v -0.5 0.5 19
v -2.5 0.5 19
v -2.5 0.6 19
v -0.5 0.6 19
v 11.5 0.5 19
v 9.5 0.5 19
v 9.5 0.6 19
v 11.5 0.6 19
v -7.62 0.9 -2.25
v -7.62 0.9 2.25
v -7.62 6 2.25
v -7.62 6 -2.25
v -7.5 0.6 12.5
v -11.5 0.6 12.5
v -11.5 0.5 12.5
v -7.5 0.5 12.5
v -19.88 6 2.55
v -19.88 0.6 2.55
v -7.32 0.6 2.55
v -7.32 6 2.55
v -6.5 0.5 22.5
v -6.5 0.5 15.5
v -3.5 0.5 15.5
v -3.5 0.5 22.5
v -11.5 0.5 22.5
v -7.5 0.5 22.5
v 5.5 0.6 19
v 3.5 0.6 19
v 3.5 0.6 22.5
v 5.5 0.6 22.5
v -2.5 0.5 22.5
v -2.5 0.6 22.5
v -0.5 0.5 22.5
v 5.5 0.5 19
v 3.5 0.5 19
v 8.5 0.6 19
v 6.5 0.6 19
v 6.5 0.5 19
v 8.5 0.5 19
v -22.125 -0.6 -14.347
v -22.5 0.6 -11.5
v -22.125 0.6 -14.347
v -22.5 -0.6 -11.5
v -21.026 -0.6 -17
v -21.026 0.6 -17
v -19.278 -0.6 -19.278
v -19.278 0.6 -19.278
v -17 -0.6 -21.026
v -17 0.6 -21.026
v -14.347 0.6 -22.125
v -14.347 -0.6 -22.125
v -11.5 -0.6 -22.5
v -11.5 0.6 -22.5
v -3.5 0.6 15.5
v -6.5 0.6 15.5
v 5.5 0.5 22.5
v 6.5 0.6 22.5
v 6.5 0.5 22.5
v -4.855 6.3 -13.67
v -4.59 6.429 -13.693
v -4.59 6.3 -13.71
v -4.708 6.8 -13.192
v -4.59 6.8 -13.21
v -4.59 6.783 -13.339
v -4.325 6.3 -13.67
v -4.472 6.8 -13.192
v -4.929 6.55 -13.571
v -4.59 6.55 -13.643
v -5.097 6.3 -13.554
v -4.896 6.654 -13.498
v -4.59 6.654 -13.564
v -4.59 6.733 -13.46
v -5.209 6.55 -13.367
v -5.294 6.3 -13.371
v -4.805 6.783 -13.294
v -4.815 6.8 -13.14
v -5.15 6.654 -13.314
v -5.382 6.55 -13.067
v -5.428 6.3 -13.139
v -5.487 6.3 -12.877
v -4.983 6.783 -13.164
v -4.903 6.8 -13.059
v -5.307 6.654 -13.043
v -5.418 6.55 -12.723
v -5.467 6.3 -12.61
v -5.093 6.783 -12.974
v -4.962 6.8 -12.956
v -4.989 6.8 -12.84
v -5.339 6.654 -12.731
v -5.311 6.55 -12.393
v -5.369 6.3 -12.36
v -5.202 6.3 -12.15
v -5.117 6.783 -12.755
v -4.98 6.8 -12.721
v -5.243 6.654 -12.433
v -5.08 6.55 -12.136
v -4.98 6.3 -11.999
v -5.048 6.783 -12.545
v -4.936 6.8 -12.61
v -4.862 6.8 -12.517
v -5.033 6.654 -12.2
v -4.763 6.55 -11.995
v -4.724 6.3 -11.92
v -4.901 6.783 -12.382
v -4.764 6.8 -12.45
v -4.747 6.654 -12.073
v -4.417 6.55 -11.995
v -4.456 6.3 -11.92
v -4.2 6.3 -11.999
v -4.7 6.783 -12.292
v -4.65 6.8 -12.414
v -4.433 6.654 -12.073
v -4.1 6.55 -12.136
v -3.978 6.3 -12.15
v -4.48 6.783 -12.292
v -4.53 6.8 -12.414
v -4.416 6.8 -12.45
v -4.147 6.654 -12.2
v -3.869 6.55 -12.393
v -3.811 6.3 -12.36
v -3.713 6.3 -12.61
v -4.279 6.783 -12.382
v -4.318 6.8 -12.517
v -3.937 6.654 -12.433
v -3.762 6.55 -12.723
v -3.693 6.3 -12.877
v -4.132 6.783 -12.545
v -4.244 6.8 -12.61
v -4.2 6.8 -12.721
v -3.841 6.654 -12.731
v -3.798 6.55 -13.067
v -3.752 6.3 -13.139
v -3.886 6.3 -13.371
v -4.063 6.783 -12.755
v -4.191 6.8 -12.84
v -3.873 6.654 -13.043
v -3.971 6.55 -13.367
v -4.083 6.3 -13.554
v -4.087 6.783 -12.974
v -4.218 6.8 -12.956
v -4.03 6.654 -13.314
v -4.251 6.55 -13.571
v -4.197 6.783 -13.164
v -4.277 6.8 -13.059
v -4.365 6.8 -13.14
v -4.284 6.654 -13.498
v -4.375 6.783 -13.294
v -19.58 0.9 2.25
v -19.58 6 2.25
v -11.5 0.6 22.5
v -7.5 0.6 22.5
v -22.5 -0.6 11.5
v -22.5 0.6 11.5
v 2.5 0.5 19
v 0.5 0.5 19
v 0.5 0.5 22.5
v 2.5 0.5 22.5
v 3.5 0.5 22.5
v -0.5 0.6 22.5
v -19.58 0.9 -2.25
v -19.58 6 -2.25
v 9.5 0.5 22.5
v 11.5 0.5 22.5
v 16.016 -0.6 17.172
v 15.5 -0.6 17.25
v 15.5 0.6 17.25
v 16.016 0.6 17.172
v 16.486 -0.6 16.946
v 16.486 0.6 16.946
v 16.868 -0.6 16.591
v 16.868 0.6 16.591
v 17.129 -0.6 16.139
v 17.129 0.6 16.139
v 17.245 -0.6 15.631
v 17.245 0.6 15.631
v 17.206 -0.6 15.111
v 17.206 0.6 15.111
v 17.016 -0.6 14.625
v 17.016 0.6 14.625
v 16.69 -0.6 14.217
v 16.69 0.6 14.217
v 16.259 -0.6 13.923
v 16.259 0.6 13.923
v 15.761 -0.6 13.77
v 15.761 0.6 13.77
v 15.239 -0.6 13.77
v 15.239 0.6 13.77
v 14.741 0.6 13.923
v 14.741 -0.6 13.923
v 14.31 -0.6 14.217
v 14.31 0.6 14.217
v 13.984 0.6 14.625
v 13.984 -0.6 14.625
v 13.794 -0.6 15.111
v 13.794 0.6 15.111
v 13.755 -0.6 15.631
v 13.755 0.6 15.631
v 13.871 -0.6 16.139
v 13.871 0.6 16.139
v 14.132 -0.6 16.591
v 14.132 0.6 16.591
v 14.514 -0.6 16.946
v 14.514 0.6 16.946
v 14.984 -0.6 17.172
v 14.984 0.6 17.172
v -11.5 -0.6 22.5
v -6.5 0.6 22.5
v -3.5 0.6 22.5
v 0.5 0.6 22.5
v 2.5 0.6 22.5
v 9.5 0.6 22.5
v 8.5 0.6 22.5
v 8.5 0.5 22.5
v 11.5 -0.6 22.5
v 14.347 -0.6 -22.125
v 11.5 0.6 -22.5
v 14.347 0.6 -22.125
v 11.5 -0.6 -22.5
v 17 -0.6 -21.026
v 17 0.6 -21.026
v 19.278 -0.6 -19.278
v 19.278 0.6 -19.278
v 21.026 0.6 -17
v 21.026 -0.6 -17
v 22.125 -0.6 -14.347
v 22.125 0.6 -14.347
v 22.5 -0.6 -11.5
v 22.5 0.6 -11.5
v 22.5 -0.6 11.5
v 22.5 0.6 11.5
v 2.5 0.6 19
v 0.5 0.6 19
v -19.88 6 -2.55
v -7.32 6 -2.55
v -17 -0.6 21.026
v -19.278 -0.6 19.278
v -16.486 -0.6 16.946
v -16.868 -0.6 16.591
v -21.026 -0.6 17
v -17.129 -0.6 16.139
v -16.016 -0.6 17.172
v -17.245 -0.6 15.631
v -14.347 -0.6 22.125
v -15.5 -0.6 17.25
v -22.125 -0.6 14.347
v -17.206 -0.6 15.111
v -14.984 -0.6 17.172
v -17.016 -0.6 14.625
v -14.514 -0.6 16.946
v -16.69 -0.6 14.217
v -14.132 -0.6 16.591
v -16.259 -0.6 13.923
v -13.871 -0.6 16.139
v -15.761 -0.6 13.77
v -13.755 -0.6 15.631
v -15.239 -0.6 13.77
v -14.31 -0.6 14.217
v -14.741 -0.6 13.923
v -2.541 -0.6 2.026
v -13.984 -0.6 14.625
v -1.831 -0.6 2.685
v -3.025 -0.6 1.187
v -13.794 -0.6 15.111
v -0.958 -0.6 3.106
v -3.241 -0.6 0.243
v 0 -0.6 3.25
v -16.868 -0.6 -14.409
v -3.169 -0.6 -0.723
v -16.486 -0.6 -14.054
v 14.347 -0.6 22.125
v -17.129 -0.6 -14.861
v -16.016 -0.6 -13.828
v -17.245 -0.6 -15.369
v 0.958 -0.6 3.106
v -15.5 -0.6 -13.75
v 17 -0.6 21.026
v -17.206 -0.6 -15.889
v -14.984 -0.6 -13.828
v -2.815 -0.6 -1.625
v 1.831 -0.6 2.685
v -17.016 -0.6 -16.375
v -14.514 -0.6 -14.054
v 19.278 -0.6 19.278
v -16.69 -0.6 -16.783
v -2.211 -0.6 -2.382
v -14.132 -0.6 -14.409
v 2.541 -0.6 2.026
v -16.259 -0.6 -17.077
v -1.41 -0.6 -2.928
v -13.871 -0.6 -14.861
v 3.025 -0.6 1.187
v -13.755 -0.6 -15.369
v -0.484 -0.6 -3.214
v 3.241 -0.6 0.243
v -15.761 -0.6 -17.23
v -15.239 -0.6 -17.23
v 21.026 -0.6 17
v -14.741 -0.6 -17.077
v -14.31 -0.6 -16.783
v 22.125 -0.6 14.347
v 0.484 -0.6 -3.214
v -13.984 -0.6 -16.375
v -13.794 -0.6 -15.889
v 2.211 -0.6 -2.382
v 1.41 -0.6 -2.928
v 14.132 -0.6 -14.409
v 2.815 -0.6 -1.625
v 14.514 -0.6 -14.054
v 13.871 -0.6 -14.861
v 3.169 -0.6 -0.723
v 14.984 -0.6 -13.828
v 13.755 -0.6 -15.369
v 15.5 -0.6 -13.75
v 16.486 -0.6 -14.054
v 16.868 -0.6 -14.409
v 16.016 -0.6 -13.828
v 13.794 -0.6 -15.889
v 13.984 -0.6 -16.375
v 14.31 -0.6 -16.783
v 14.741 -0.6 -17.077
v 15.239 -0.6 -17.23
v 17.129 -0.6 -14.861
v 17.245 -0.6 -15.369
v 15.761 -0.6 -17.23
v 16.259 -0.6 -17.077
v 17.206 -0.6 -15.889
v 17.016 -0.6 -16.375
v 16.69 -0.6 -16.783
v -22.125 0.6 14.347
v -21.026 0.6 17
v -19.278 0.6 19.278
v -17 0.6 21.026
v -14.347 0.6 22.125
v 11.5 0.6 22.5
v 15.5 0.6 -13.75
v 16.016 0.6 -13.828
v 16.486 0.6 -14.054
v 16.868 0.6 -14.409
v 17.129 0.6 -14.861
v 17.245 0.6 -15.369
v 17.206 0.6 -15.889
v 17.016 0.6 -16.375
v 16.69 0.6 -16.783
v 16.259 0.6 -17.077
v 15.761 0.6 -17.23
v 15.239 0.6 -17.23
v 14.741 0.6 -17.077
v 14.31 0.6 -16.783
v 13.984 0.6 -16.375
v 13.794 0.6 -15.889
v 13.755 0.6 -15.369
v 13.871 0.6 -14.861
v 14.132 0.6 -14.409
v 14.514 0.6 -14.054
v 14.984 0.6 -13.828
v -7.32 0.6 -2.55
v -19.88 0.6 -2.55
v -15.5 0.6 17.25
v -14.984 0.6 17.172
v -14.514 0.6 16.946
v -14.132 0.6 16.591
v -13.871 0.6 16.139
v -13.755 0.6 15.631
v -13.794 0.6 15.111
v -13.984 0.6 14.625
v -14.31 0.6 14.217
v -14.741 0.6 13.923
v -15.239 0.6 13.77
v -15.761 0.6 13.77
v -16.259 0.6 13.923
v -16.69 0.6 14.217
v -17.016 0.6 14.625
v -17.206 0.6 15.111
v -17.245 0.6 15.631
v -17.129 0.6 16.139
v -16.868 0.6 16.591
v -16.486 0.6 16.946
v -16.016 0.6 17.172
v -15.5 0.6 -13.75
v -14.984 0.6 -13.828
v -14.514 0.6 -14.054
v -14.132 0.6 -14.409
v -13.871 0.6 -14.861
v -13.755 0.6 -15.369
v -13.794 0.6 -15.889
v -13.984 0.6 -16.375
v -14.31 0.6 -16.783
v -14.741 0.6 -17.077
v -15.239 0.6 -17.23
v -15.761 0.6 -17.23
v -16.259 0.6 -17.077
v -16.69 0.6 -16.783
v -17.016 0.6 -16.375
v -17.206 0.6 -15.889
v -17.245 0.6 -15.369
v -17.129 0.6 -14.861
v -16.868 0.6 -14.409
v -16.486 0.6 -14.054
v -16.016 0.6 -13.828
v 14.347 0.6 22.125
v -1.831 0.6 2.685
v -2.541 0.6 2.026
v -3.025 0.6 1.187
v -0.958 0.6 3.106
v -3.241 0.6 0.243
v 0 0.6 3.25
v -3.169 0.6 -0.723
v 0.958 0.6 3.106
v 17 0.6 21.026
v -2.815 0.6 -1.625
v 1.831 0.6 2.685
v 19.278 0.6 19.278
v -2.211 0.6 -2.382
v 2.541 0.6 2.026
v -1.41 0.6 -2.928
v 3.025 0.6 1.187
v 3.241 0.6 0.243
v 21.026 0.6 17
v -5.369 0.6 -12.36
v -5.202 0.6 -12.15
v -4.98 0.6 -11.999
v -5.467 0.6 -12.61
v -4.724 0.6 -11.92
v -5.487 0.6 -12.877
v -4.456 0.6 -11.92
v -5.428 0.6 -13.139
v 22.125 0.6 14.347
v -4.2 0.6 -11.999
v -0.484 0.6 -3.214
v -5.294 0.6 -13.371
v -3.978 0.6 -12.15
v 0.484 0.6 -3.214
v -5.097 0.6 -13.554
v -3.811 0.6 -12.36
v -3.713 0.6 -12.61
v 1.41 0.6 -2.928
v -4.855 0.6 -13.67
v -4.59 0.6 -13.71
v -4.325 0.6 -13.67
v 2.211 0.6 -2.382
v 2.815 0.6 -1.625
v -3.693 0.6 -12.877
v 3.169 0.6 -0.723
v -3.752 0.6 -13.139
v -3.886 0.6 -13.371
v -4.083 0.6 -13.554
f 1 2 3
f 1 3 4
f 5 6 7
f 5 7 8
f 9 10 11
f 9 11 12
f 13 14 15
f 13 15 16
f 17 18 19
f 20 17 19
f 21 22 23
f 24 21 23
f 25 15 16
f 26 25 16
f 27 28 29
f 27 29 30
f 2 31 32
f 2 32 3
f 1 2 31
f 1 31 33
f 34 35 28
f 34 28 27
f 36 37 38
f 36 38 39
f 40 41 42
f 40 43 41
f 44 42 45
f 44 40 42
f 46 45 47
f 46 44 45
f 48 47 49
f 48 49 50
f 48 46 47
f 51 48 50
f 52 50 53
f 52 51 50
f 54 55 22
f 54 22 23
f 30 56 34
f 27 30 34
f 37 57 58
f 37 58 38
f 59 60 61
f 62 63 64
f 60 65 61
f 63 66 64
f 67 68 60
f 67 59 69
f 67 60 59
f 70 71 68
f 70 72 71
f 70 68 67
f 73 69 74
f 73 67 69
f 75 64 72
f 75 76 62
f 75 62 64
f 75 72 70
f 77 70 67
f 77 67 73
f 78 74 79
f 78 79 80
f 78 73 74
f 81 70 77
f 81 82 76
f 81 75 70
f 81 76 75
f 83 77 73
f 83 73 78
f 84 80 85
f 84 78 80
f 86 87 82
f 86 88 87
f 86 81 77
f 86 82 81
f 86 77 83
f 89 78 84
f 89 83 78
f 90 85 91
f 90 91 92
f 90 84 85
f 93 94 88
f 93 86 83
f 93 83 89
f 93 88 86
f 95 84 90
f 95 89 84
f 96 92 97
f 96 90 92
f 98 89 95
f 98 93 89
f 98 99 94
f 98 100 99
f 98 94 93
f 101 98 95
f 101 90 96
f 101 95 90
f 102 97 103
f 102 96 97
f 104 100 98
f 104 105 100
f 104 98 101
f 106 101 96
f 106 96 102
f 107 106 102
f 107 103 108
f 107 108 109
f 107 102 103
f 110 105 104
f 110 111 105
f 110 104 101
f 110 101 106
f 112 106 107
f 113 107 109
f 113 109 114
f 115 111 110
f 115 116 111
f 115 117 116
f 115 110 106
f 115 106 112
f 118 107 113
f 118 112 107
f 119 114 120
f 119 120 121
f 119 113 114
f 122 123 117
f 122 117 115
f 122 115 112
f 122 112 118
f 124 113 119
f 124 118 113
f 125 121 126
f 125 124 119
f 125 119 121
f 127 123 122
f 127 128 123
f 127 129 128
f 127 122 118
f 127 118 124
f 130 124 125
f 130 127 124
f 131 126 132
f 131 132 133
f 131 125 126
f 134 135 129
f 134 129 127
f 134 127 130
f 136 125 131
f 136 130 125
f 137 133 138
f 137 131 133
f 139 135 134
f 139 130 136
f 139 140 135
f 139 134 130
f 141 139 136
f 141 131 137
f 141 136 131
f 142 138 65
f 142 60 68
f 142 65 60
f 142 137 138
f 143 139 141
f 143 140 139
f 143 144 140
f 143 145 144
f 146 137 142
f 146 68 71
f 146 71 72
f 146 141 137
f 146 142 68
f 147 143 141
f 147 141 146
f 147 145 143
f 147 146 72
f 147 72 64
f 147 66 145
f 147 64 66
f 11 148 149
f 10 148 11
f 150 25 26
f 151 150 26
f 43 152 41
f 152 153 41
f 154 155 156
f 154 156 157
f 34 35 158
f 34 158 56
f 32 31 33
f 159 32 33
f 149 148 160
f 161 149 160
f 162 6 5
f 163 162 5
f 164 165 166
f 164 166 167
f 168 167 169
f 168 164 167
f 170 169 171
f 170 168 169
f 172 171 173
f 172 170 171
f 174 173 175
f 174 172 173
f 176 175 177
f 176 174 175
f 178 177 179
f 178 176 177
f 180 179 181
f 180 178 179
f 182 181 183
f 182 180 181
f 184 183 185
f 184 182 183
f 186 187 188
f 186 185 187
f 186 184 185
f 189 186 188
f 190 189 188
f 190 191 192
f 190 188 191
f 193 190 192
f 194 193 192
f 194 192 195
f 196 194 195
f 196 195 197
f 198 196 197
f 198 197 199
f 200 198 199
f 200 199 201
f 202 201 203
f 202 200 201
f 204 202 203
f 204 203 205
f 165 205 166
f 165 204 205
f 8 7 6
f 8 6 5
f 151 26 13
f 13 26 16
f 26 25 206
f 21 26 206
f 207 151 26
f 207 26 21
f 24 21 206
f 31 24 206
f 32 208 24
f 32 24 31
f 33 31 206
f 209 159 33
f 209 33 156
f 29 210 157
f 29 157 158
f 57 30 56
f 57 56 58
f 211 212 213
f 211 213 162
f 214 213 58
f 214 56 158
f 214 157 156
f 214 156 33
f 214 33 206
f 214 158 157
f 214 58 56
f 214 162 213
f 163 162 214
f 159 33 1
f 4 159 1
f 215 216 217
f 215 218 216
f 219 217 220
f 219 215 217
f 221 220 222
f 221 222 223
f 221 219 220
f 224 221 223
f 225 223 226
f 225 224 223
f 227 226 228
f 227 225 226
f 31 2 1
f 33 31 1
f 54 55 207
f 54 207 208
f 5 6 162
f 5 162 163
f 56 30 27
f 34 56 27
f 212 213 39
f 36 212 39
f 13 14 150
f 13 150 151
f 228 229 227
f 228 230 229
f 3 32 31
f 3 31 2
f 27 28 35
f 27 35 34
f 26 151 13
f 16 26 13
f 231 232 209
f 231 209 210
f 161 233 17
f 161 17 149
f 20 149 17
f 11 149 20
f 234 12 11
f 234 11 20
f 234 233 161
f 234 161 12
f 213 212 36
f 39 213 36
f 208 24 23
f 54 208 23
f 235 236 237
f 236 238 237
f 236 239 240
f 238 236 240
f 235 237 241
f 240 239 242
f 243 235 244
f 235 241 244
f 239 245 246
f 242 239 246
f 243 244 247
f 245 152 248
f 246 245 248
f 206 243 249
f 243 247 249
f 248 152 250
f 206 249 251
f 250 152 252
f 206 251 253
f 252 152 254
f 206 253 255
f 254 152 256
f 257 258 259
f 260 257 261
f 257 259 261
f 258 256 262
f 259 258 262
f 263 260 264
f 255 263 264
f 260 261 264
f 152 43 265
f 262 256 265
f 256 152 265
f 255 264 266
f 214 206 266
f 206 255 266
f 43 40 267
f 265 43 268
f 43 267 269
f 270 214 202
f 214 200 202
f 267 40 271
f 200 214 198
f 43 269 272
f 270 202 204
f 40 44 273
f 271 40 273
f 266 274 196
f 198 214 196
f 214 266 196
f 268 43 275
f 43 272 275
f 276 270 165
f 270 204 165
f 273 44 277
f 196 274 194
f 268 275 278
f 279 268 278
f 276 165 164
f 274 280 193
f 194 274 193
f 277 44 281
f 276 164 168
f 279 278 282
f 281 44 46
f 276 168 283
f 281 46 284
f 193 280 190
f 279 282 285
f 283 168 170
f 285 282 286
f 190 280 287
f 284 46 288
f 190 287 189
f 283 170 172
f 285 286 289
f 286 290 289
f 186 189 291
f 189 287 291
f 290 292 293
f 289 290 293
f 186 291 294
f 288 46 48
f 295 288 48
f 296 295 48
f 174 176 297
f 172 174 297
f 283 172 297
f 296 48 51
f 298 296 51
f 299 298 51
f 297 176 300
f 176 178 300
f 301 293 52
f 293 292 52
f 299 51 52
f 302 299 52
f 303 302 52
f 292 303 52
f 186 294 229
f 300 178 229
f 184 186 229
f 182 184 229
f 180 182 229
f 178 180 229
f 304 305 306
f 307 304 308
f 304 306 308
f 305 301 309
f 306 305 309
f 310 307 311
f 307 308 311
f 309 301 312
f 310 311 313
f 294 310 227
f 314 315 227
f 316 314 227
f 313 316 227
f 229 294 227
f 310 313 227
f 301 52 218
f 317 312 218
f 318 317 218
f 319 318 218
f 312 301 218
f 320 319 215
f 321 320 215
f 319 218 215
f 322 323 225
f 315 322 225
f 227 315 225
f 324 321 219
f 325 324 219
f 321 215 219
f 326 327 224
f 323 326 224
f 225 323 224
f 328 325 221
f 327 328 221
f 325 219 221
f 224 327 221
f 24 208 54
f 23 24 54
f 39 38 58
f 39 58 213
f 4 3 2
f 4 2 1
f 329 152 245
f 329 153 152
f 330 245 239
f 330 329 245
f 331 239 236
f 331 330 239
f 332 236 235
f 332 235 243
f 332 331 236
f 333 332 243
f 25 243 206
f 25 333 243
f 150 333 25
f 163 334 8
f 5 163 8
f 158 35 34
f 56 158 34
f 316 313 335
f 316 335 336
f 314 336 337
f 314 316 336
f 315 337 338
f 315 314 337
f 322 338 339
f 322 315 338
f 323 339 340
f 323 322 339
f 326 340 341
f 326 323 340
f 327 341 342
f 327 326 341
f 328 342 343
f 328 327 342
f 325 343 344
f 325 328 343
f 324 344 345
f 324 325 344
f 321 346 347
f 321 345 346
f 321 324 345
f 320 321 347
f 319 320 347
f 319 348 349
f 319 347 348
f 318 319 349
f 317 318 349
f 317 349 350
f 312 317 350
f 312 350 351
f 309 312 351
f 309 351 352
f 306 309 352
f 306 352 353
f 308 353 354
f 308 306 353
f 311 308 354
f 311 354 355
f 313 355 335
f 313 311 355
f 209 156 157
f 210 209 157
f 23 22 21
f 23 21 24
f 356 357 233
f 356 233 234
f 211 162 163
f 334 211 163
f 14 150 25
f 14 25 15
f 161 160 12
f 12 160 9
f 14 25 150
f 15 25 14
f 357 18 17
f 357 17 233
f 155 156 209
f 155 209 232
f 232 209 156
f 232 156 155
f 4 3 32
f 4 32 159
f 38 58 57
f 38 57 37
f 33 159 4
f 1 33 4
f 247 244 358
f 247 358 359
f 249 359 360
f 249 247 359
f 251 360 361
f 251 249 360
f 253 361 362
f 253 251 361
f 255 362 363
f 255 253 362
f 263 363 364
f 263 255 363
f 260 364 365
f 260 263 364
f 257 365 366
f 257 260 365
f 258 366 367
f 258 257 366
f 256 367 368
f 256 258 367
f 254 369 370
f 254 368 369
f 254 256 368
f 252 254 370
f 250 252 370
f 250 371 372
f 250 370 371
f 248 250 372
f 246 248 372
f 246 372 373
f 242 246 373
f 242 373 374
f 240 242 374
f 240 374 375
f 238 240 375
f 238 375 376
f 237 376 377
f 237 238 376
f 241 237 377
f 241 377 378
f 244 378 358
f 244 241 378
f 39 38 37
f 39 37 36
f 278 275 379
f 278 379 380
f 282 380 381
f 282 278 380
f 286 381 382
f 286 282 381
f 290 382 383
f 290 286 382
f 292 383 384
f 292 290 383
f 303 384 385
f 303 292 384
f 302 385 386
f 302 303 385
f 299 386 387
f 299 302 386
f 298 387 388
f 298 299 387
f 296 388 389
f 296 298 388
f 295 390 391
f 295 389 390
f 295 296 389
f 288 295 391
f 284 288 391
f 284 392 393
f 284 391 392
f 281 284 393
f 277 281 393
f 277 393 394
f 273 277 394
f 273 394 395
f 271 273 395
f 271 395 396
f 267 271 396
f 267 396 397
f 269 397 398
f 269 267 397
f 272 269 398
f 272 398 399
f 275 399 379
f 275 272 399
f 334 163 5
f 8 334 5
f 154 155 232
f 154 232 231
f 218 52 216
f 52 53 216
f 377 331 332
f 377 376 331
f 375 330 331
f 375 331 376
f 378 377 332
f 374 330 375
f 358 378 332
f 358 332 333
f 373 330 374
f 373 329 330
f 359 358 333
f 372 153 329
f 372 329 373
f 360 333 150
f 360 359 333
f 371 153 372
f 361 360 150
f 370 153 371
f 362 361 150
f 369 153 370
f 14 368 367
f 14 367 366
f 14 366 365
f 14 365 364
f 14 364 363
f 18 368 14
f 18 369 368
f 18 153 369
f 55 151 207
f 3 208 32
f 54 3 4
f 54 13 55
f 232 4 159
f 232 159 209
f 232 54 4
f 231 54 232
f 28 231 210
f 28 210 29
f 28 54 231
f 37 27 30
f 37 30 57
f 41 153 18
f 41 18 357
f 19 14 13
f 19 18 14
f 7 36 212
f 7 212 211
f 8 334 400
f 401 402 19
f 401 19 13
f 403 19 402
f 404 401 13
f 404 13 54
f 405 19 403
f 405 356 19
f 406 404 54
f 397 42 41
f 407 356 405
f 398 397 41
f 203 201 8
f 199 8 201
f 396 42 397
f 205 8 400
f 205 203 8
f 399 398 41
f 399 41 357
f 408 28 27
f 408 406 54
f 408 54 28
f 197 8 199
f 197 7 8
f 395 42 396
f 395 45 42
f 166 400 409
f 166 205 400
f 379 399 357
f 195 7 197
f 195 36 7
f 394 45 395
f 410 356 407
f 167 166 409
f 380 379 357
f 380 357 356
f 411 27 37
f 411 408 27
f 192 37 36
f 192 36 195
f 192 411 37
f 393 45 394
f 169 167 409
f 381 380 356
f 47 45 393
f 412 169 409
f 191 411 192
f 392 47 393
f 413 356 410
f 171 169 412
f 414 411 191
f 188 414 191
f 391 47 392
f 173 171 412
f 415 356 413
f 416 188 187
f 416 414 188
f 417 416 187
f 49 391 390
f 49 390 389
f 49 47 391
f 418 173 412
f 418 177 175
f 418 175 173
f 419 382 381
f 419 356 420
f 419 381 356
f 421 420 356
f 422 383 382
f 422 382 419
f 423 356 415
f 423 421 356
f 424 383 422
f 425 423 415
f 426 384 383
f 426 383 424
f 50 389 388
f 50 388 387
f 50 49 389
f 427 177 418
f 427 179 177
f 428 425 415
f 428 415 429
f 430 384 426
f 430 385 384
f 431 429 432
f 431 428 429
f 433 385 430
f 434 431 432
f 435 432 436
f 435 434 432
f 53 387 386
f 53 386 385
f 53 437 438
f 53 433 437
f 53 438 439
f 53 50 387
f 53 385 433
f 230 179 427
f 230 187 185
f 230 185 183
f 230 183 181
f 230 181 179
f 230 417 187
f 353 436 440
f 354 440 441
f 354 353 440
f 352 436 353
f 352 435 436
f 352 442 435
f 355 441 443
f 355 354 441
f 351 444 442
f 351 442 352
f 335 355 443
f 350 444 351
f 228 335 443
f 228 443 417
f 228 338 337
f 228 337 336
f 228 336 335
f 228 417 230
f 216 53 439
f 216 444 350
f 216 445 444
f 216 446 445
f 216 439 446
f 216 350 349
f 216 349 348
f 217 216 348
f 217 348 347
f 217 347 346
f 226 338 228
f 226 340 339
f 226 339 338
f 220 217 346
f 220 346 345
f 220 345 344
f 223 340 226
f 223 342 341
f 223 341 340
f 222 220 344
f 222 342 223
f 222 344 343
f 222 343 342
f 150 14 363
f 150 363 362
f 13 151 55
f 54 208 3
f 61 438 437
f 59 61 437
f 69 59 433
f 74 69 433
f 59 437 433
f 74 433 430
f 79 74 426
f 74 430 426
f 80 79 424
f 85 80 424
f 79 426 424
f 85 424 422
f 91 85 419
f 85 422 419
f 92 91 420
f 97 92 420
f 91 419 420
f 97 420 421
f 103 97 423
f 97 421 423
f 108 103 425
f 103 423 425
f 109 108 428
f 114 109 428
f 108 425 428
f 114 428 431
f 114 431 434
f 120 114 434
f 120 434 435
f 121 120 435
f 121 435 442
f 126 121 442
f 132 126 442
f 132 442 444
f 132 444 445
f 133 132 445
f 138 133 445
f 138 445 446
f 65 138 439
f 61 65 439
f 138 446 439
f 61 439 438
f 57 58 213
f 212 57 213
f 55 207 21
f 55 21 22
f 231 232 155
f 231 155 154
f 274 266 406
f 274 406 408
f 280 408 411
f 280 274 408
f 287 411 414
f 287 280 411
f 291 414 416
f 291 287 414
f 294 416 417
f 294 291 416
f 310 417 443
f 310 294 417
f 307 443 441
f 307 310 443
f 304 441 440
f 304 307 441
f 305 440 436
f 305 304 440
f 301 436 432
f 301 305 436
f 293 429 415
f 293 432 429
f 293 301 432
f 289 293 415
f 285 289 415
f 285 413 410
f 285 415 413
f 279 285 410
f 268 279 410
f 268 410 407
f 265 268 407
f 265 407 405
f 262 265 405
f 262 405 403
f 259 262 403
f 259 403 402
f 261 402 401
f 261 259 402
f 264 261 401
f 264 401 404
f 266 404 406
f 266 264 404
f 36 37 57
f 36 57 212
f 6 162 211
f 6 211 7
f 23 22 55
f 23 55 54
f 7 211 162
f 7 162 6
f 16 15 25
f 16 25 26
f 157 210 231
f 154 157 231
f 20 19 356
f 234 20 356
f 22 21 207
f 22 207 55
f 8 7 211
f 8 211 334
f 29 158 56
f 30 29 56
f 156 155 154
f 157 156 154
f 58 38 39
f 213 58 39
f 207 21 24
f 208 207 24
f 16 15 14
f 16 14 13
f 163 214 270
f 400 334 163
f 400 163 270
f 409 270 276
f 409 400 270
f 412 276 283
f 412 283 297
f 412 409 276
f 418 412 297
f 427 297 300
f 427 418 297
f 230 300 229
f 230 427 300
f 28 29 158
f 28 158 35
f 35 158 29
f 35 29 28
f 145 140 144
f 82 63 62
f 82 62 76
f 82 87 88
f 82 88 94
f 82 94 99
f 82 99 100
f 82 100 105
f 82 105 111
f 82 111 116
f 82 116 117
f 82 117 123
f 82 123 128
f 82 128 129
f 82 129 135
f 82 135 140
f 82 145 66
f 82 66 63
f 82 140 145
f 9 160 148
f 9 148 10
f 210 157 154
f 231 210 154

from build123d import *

# Parameters (mm, degrees)
SKETCH1_W               = 45
SKETCH1_H               = 45
BOSS_EXTRUDE1_DEPTH     = 0.6
CUT_EXTRUDE1_DEPTH      = 32.825461505
CUT_EXTRUDE1_DEPTH_BACK = 32.825461505
SKETCH3_R               = 3.25
FILLET1_R               = 11
CUT_EXTRUDE2_DEPTH      = 32.825461505
CUT_EXTRUDE2_DEPTH_BACK = 32.825461505
SKETCH5_R               = 1.75
SKETCH6_W               = 12.56
SKETCH6_H               = 5.1
SKETCH6_W_2             = 11.96
SKETCH6_H_2             = 4.5
EXTRUDE_THIN1_DEPTH     = 5.4
SKETCH7_W               = 11.96
SKETCH7_H               = 4.5
BOSS_EXTRUDE2_DEPTH     = 0.3
SKETCH8_W               = 2
SKETCH8_H               = 3.5
SKETCH8_W_2             = 4
SKETCH8_H_2             = 10
SKETCH8_W_3             = 3
SKETCH8_H_3             = 7
CUT_EXTRUDE3_DEPTH      = 0.1
SKETCH9_W               = 2
SKETCH9_H               = 3.5
BOSS_EXTRUDE3_DEPTH     = 0.1
BOSS_EXTRUDE3_2_DEPTH   = 0.1
BOSS_EXTRUDE3_3_DEPTH   = 0.1
BOSS_EXTRUDE3_4_DEPTH   = 0.1
BOSS_EXTRUDE3_5_DEPTH   = 0.1
SKETCH9_W_2             = 3
SKETCH9_H_2             = 7
BOSS_EXTRUDE3_6_DEPTH   = 0.1
SKETCH9_W_3             = 4
SKETCH9_H_3             = 10
BOSS_EXTRUDE3_7_DEPTH   = 0.1
SKETCH10_R              = 0.9
BOSS_EXTRUDE4_DEPTH     = 6.2
FILLET2_R               = 0.5


with BuildPart() as part:
    # Sketch1 → Boss-Extrude1 (new, symmetric)
    with BuildSketch(Plane(origin=(0, 0, 0), x_dir=(1, 0, 0), z_dir=(0, 1, 0))):
        Rectangle(SKETCH1_W, SKETCH1_H)
    extrude(amount=BOSS_EXTRUDE1_DEPTH, both=True)

    # Sketch3 → Cut-Extrude1 (cut, two sides: drawn at the far end of the back side and taken through both)
    with BuildSketch(Plane(origin=(0, 0, 0), x_dir=(1, 0, 0), z_dir=(0, 1, 0)).offset(-CUT_EXTRUDE1_DEPTH_BACK)):
        with Locations(Location((0, 0, 0), (0, 0, 270))):
            Circle(SKETCH3_R)
    extrude(amount=CUT_EXTRUDE1_DEPTH + CUT_EXTRUDE1_DEPTH_BACK, mode=Mode.SUBTRACT)

    # Fillet1
    fillet1_edges = [part.edges().sort_by_distance(p)[0] for p in [
        (22.5, 0, 22.5),
        (-22.5, 0, 22.5),
        (-22.5, 0, -22.5),
        (22.5, 0, -22.5),
    ]]
    fillet(fillet1_edges, radius=FILLET1_R)

    # Sketch5 → Cut-Extrude2 (cut, two sides: drawn at the far end of the back side and taken through both)
    with BuildSketch(Plane(origin=(0, 0, 0), x_dir=(1, 0, 0), z_dir=(0, 1, 0)).offset(-CUT_EXTRUDE2_DEPTH_BACK)):
        with Locations(Location((-15.5, 15.5, 0), (0, 0, 270))):
            Circle(SKETCH5_R)
        with Locations(Location((15.5, 15.5, 0), (0, 0, 270))):
            Circle(SKETCH5_R)
        with Locations(Location((15.5, -15.5, 0), (0, 0, 270))):
            Circle(SKETCH5_R)
        with Locations(Location((-15.5, -15.5, 0), (0, 0, 270))):
            Circle(SKETCH5_R)
    extrude(amount=CUT_EXTRUDE2_DEPTH + CUT_EXTRUDE2_DEPTH_BACK, mode=Mode.SUBTRACT)

    # Sketch6 → Extrude-Thin1 (add)
    with BuildSketch(Plane(origin=(0, 0.6, 0), x_dir=(1, 0, 0), z_dir=(0, 1, 0))):
        with Locations((-13.6, 0)):
            Rectangle(SKETCH6_W, SKETCH6_H)
        with Locations((-13.6, 0)):
            Rectangle(SKETCH6_W_2, SKETCH6_H_2, mode=Mode.SUBTRACT)
    extrude(amount=EXTRUDE_THIN1_DEPTH)

    # Sketch7 → Boss-Extrude2 (add)
    with BuildSketch(Plane(origin=(0, 0.6, 0), x_dir=(1, 0, 0), z_dir=(0, 1, 0))):
        with Locations((-13.6, 0)):
            Rectangle(SKETCH7_W, SKETCH7_H)
    extrude(amount=BOSS_EXTRUDE2_DEPTH)

    # Sketch8 → Cut-Extrude3 (cut)
    with BuildSketch(Plane(origin=(0, 0.6, 0), x_dir=(1, 0, 0), z_dir=(0, 1, 0))):
        with Locations((-1.5, -20.75)):
            Rectangle(SKETCH8_W, SKETCH8_H)
        with Locations((1.5, -20.75)):
            Rectangle(SKETCH8_W, SKETCH8_H)
        with Locations((4.5, -20.75)):
            Rectangle(SKETCH8_W, SKETCH8_H)
        with Locations((7.5, -20.75)):
            Rectangle(SKETCH8_W, SKETCH8_H)
        with Locations((10.5, -20.75)):
            Rectangle(SKETCH8_W, SKETCH8_H)
        with Locations((-9.5, -17.5)):
            Rectangle(SKETCH8_W_2, SKETCH8_H_2)
        with Locations((-5, -19)):
            Rectangle(SKETCH8_W_3, SKETCH8_H_3)
    extrude(amount=-CUT_EXTRUDE3_DEPTH, mode=Mode.SUBTRACT)

    # Sketch10 → Boss-Extrude4 (add)
    with BuildSketch(Plane(origin=(0, 0.6, 0), x_dir=(1, 0, 0), z_dir=(0, 1, 0))):
        with Locations(Location((-4.59, 12.81, 0), (0, 0, 90))):
            Circle(SKETCH10_R)
    extrude(amount=BOSS_EXTRUDE4_DEPTH)

    # Fillet2
    fillet2_edges = [part.edges().sort_by_distance(p)[0] for p in [
        (-4.59, 6.8, -11.91),
    ]]
    fillet(fillet2_edges, radius=FILLET2_R)


with BuildPart() as body_2:
    # Sketch9 → Boss-Extrude3 (new body)
    with BuildSketch(Plane(origin=(0, 0.5, 0), x_dir=(1, 0, 0), z_dir=(0, 1, 0))):
        with Locations((10.5, -20.75)):
            Rectangle(SKETCH9_W, SKETCH9_H)
    extrude(amount=BOSS_EXTRUDE3_DEPTH)


with BuildPart() as body_3:
    # Sketch9 → Boss-Extrude3 2 (new body)
    with BuildSketch(Plane(origin=(0, 0.5, 0), x_dir=(1, 0, 0), z_dir=(0, 1, 0))):
        with Locations((7.5, -20.75)):
            Rectangle(SKETCH9_W, SKETCH9_H)
    extrude(amount=BOSS_EXTRUDE3_2_DEPTH)


with BuildPart() as body_4:
    # Sketch9 → Boss-Extrude3 3 (new body)
    with BuildSketch(Plane(origin=(0, 0.5, 0), x_dir=(1, 0, 0), z_dir=(0, 1, 0))):
        with Locations((4.5, -20.75)):
            Rectangle(SKETCH9_W, SKETCH9_H)
    extrude(amount=BOSS_EXTRUDE3_3_DEPTH)


with BuildPart() as body_5:
    # Sketch9 → Boss-Extrude3 4 (new body)
    with BuildSketch(Plane(origin=(0, 0.5, 0), x_dir=(1, 0, 0), z_dir=(0, 1, 0))):
        with Locations((1.5, -20.75)):
            Rectangle(SKETCH9_W, SKETCH9_H)
    extrude(amount=BOSS_EXTRUDE3_4_DEPTH)


with BuildPart() as body_6:
    # Sketch9 → Boss-Extrude3 5 (new body)
    with BuildSketch(Plane(origin=(0, 0.5, 0), x_dir=(1, 0, 0), z_dir=(0, 1, 0))):
        with Locations((-1.5, -20.75)):
            Rectangle(SKETCH9_W, SKETCH9_H)
    extrude(amount=BOSS_EXTRUDE3_5_DEPTH)


with BuildPart() as body_7:
    # Sketch9 → Boss-Extrude3 6 (new body)
    with BuildSketch(Plane(origin=(0, 0.5, 0), x_dir=(1, 0, 0), z_dir=(0, 1, 0))):
        with Locations((-5, -19)):
            Rectangle(SKETCH9_W_2, SKETCH9_H_2)
    extrude(amount=BOSS_EXTRUDE3_6_DEPTH)


with BuildPart() as body_8:
    # Sketch9 → Boss-Extrude3 7 (new body)
    with BuildSketch(Plane(origin=(0, 0.5, 0), x_dir=(1, 0, 0), z_dir=(0, 1, 0))):
        with Locations((-9.5, -17.5)):
            Rectangle(SKETCH9_W_3, SKETCH9_H_3)
    extrude(amount=BOSS_EXTRUDE3_7_DEPTH)


solid = Compound([part.part, body_2.part, body_3.part, body_4.part, body_5.part, body_6.part, body_7.part, body_8.part])
